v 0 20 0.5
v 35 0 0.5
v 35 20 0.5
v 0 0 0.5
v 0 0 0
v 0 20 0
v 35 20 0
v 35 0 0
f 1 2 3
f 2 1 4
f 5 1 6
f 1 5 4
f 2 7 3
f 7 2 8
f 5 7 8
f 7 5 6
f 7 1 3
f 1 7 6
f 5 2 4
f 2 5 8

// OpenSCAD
difference(){
cube([35,20,0.5]);
for(i=[1:6]){
    
    translate([i*5,10,0]){
        circle(0.7+(i*0.05),$fn=100);}}}
